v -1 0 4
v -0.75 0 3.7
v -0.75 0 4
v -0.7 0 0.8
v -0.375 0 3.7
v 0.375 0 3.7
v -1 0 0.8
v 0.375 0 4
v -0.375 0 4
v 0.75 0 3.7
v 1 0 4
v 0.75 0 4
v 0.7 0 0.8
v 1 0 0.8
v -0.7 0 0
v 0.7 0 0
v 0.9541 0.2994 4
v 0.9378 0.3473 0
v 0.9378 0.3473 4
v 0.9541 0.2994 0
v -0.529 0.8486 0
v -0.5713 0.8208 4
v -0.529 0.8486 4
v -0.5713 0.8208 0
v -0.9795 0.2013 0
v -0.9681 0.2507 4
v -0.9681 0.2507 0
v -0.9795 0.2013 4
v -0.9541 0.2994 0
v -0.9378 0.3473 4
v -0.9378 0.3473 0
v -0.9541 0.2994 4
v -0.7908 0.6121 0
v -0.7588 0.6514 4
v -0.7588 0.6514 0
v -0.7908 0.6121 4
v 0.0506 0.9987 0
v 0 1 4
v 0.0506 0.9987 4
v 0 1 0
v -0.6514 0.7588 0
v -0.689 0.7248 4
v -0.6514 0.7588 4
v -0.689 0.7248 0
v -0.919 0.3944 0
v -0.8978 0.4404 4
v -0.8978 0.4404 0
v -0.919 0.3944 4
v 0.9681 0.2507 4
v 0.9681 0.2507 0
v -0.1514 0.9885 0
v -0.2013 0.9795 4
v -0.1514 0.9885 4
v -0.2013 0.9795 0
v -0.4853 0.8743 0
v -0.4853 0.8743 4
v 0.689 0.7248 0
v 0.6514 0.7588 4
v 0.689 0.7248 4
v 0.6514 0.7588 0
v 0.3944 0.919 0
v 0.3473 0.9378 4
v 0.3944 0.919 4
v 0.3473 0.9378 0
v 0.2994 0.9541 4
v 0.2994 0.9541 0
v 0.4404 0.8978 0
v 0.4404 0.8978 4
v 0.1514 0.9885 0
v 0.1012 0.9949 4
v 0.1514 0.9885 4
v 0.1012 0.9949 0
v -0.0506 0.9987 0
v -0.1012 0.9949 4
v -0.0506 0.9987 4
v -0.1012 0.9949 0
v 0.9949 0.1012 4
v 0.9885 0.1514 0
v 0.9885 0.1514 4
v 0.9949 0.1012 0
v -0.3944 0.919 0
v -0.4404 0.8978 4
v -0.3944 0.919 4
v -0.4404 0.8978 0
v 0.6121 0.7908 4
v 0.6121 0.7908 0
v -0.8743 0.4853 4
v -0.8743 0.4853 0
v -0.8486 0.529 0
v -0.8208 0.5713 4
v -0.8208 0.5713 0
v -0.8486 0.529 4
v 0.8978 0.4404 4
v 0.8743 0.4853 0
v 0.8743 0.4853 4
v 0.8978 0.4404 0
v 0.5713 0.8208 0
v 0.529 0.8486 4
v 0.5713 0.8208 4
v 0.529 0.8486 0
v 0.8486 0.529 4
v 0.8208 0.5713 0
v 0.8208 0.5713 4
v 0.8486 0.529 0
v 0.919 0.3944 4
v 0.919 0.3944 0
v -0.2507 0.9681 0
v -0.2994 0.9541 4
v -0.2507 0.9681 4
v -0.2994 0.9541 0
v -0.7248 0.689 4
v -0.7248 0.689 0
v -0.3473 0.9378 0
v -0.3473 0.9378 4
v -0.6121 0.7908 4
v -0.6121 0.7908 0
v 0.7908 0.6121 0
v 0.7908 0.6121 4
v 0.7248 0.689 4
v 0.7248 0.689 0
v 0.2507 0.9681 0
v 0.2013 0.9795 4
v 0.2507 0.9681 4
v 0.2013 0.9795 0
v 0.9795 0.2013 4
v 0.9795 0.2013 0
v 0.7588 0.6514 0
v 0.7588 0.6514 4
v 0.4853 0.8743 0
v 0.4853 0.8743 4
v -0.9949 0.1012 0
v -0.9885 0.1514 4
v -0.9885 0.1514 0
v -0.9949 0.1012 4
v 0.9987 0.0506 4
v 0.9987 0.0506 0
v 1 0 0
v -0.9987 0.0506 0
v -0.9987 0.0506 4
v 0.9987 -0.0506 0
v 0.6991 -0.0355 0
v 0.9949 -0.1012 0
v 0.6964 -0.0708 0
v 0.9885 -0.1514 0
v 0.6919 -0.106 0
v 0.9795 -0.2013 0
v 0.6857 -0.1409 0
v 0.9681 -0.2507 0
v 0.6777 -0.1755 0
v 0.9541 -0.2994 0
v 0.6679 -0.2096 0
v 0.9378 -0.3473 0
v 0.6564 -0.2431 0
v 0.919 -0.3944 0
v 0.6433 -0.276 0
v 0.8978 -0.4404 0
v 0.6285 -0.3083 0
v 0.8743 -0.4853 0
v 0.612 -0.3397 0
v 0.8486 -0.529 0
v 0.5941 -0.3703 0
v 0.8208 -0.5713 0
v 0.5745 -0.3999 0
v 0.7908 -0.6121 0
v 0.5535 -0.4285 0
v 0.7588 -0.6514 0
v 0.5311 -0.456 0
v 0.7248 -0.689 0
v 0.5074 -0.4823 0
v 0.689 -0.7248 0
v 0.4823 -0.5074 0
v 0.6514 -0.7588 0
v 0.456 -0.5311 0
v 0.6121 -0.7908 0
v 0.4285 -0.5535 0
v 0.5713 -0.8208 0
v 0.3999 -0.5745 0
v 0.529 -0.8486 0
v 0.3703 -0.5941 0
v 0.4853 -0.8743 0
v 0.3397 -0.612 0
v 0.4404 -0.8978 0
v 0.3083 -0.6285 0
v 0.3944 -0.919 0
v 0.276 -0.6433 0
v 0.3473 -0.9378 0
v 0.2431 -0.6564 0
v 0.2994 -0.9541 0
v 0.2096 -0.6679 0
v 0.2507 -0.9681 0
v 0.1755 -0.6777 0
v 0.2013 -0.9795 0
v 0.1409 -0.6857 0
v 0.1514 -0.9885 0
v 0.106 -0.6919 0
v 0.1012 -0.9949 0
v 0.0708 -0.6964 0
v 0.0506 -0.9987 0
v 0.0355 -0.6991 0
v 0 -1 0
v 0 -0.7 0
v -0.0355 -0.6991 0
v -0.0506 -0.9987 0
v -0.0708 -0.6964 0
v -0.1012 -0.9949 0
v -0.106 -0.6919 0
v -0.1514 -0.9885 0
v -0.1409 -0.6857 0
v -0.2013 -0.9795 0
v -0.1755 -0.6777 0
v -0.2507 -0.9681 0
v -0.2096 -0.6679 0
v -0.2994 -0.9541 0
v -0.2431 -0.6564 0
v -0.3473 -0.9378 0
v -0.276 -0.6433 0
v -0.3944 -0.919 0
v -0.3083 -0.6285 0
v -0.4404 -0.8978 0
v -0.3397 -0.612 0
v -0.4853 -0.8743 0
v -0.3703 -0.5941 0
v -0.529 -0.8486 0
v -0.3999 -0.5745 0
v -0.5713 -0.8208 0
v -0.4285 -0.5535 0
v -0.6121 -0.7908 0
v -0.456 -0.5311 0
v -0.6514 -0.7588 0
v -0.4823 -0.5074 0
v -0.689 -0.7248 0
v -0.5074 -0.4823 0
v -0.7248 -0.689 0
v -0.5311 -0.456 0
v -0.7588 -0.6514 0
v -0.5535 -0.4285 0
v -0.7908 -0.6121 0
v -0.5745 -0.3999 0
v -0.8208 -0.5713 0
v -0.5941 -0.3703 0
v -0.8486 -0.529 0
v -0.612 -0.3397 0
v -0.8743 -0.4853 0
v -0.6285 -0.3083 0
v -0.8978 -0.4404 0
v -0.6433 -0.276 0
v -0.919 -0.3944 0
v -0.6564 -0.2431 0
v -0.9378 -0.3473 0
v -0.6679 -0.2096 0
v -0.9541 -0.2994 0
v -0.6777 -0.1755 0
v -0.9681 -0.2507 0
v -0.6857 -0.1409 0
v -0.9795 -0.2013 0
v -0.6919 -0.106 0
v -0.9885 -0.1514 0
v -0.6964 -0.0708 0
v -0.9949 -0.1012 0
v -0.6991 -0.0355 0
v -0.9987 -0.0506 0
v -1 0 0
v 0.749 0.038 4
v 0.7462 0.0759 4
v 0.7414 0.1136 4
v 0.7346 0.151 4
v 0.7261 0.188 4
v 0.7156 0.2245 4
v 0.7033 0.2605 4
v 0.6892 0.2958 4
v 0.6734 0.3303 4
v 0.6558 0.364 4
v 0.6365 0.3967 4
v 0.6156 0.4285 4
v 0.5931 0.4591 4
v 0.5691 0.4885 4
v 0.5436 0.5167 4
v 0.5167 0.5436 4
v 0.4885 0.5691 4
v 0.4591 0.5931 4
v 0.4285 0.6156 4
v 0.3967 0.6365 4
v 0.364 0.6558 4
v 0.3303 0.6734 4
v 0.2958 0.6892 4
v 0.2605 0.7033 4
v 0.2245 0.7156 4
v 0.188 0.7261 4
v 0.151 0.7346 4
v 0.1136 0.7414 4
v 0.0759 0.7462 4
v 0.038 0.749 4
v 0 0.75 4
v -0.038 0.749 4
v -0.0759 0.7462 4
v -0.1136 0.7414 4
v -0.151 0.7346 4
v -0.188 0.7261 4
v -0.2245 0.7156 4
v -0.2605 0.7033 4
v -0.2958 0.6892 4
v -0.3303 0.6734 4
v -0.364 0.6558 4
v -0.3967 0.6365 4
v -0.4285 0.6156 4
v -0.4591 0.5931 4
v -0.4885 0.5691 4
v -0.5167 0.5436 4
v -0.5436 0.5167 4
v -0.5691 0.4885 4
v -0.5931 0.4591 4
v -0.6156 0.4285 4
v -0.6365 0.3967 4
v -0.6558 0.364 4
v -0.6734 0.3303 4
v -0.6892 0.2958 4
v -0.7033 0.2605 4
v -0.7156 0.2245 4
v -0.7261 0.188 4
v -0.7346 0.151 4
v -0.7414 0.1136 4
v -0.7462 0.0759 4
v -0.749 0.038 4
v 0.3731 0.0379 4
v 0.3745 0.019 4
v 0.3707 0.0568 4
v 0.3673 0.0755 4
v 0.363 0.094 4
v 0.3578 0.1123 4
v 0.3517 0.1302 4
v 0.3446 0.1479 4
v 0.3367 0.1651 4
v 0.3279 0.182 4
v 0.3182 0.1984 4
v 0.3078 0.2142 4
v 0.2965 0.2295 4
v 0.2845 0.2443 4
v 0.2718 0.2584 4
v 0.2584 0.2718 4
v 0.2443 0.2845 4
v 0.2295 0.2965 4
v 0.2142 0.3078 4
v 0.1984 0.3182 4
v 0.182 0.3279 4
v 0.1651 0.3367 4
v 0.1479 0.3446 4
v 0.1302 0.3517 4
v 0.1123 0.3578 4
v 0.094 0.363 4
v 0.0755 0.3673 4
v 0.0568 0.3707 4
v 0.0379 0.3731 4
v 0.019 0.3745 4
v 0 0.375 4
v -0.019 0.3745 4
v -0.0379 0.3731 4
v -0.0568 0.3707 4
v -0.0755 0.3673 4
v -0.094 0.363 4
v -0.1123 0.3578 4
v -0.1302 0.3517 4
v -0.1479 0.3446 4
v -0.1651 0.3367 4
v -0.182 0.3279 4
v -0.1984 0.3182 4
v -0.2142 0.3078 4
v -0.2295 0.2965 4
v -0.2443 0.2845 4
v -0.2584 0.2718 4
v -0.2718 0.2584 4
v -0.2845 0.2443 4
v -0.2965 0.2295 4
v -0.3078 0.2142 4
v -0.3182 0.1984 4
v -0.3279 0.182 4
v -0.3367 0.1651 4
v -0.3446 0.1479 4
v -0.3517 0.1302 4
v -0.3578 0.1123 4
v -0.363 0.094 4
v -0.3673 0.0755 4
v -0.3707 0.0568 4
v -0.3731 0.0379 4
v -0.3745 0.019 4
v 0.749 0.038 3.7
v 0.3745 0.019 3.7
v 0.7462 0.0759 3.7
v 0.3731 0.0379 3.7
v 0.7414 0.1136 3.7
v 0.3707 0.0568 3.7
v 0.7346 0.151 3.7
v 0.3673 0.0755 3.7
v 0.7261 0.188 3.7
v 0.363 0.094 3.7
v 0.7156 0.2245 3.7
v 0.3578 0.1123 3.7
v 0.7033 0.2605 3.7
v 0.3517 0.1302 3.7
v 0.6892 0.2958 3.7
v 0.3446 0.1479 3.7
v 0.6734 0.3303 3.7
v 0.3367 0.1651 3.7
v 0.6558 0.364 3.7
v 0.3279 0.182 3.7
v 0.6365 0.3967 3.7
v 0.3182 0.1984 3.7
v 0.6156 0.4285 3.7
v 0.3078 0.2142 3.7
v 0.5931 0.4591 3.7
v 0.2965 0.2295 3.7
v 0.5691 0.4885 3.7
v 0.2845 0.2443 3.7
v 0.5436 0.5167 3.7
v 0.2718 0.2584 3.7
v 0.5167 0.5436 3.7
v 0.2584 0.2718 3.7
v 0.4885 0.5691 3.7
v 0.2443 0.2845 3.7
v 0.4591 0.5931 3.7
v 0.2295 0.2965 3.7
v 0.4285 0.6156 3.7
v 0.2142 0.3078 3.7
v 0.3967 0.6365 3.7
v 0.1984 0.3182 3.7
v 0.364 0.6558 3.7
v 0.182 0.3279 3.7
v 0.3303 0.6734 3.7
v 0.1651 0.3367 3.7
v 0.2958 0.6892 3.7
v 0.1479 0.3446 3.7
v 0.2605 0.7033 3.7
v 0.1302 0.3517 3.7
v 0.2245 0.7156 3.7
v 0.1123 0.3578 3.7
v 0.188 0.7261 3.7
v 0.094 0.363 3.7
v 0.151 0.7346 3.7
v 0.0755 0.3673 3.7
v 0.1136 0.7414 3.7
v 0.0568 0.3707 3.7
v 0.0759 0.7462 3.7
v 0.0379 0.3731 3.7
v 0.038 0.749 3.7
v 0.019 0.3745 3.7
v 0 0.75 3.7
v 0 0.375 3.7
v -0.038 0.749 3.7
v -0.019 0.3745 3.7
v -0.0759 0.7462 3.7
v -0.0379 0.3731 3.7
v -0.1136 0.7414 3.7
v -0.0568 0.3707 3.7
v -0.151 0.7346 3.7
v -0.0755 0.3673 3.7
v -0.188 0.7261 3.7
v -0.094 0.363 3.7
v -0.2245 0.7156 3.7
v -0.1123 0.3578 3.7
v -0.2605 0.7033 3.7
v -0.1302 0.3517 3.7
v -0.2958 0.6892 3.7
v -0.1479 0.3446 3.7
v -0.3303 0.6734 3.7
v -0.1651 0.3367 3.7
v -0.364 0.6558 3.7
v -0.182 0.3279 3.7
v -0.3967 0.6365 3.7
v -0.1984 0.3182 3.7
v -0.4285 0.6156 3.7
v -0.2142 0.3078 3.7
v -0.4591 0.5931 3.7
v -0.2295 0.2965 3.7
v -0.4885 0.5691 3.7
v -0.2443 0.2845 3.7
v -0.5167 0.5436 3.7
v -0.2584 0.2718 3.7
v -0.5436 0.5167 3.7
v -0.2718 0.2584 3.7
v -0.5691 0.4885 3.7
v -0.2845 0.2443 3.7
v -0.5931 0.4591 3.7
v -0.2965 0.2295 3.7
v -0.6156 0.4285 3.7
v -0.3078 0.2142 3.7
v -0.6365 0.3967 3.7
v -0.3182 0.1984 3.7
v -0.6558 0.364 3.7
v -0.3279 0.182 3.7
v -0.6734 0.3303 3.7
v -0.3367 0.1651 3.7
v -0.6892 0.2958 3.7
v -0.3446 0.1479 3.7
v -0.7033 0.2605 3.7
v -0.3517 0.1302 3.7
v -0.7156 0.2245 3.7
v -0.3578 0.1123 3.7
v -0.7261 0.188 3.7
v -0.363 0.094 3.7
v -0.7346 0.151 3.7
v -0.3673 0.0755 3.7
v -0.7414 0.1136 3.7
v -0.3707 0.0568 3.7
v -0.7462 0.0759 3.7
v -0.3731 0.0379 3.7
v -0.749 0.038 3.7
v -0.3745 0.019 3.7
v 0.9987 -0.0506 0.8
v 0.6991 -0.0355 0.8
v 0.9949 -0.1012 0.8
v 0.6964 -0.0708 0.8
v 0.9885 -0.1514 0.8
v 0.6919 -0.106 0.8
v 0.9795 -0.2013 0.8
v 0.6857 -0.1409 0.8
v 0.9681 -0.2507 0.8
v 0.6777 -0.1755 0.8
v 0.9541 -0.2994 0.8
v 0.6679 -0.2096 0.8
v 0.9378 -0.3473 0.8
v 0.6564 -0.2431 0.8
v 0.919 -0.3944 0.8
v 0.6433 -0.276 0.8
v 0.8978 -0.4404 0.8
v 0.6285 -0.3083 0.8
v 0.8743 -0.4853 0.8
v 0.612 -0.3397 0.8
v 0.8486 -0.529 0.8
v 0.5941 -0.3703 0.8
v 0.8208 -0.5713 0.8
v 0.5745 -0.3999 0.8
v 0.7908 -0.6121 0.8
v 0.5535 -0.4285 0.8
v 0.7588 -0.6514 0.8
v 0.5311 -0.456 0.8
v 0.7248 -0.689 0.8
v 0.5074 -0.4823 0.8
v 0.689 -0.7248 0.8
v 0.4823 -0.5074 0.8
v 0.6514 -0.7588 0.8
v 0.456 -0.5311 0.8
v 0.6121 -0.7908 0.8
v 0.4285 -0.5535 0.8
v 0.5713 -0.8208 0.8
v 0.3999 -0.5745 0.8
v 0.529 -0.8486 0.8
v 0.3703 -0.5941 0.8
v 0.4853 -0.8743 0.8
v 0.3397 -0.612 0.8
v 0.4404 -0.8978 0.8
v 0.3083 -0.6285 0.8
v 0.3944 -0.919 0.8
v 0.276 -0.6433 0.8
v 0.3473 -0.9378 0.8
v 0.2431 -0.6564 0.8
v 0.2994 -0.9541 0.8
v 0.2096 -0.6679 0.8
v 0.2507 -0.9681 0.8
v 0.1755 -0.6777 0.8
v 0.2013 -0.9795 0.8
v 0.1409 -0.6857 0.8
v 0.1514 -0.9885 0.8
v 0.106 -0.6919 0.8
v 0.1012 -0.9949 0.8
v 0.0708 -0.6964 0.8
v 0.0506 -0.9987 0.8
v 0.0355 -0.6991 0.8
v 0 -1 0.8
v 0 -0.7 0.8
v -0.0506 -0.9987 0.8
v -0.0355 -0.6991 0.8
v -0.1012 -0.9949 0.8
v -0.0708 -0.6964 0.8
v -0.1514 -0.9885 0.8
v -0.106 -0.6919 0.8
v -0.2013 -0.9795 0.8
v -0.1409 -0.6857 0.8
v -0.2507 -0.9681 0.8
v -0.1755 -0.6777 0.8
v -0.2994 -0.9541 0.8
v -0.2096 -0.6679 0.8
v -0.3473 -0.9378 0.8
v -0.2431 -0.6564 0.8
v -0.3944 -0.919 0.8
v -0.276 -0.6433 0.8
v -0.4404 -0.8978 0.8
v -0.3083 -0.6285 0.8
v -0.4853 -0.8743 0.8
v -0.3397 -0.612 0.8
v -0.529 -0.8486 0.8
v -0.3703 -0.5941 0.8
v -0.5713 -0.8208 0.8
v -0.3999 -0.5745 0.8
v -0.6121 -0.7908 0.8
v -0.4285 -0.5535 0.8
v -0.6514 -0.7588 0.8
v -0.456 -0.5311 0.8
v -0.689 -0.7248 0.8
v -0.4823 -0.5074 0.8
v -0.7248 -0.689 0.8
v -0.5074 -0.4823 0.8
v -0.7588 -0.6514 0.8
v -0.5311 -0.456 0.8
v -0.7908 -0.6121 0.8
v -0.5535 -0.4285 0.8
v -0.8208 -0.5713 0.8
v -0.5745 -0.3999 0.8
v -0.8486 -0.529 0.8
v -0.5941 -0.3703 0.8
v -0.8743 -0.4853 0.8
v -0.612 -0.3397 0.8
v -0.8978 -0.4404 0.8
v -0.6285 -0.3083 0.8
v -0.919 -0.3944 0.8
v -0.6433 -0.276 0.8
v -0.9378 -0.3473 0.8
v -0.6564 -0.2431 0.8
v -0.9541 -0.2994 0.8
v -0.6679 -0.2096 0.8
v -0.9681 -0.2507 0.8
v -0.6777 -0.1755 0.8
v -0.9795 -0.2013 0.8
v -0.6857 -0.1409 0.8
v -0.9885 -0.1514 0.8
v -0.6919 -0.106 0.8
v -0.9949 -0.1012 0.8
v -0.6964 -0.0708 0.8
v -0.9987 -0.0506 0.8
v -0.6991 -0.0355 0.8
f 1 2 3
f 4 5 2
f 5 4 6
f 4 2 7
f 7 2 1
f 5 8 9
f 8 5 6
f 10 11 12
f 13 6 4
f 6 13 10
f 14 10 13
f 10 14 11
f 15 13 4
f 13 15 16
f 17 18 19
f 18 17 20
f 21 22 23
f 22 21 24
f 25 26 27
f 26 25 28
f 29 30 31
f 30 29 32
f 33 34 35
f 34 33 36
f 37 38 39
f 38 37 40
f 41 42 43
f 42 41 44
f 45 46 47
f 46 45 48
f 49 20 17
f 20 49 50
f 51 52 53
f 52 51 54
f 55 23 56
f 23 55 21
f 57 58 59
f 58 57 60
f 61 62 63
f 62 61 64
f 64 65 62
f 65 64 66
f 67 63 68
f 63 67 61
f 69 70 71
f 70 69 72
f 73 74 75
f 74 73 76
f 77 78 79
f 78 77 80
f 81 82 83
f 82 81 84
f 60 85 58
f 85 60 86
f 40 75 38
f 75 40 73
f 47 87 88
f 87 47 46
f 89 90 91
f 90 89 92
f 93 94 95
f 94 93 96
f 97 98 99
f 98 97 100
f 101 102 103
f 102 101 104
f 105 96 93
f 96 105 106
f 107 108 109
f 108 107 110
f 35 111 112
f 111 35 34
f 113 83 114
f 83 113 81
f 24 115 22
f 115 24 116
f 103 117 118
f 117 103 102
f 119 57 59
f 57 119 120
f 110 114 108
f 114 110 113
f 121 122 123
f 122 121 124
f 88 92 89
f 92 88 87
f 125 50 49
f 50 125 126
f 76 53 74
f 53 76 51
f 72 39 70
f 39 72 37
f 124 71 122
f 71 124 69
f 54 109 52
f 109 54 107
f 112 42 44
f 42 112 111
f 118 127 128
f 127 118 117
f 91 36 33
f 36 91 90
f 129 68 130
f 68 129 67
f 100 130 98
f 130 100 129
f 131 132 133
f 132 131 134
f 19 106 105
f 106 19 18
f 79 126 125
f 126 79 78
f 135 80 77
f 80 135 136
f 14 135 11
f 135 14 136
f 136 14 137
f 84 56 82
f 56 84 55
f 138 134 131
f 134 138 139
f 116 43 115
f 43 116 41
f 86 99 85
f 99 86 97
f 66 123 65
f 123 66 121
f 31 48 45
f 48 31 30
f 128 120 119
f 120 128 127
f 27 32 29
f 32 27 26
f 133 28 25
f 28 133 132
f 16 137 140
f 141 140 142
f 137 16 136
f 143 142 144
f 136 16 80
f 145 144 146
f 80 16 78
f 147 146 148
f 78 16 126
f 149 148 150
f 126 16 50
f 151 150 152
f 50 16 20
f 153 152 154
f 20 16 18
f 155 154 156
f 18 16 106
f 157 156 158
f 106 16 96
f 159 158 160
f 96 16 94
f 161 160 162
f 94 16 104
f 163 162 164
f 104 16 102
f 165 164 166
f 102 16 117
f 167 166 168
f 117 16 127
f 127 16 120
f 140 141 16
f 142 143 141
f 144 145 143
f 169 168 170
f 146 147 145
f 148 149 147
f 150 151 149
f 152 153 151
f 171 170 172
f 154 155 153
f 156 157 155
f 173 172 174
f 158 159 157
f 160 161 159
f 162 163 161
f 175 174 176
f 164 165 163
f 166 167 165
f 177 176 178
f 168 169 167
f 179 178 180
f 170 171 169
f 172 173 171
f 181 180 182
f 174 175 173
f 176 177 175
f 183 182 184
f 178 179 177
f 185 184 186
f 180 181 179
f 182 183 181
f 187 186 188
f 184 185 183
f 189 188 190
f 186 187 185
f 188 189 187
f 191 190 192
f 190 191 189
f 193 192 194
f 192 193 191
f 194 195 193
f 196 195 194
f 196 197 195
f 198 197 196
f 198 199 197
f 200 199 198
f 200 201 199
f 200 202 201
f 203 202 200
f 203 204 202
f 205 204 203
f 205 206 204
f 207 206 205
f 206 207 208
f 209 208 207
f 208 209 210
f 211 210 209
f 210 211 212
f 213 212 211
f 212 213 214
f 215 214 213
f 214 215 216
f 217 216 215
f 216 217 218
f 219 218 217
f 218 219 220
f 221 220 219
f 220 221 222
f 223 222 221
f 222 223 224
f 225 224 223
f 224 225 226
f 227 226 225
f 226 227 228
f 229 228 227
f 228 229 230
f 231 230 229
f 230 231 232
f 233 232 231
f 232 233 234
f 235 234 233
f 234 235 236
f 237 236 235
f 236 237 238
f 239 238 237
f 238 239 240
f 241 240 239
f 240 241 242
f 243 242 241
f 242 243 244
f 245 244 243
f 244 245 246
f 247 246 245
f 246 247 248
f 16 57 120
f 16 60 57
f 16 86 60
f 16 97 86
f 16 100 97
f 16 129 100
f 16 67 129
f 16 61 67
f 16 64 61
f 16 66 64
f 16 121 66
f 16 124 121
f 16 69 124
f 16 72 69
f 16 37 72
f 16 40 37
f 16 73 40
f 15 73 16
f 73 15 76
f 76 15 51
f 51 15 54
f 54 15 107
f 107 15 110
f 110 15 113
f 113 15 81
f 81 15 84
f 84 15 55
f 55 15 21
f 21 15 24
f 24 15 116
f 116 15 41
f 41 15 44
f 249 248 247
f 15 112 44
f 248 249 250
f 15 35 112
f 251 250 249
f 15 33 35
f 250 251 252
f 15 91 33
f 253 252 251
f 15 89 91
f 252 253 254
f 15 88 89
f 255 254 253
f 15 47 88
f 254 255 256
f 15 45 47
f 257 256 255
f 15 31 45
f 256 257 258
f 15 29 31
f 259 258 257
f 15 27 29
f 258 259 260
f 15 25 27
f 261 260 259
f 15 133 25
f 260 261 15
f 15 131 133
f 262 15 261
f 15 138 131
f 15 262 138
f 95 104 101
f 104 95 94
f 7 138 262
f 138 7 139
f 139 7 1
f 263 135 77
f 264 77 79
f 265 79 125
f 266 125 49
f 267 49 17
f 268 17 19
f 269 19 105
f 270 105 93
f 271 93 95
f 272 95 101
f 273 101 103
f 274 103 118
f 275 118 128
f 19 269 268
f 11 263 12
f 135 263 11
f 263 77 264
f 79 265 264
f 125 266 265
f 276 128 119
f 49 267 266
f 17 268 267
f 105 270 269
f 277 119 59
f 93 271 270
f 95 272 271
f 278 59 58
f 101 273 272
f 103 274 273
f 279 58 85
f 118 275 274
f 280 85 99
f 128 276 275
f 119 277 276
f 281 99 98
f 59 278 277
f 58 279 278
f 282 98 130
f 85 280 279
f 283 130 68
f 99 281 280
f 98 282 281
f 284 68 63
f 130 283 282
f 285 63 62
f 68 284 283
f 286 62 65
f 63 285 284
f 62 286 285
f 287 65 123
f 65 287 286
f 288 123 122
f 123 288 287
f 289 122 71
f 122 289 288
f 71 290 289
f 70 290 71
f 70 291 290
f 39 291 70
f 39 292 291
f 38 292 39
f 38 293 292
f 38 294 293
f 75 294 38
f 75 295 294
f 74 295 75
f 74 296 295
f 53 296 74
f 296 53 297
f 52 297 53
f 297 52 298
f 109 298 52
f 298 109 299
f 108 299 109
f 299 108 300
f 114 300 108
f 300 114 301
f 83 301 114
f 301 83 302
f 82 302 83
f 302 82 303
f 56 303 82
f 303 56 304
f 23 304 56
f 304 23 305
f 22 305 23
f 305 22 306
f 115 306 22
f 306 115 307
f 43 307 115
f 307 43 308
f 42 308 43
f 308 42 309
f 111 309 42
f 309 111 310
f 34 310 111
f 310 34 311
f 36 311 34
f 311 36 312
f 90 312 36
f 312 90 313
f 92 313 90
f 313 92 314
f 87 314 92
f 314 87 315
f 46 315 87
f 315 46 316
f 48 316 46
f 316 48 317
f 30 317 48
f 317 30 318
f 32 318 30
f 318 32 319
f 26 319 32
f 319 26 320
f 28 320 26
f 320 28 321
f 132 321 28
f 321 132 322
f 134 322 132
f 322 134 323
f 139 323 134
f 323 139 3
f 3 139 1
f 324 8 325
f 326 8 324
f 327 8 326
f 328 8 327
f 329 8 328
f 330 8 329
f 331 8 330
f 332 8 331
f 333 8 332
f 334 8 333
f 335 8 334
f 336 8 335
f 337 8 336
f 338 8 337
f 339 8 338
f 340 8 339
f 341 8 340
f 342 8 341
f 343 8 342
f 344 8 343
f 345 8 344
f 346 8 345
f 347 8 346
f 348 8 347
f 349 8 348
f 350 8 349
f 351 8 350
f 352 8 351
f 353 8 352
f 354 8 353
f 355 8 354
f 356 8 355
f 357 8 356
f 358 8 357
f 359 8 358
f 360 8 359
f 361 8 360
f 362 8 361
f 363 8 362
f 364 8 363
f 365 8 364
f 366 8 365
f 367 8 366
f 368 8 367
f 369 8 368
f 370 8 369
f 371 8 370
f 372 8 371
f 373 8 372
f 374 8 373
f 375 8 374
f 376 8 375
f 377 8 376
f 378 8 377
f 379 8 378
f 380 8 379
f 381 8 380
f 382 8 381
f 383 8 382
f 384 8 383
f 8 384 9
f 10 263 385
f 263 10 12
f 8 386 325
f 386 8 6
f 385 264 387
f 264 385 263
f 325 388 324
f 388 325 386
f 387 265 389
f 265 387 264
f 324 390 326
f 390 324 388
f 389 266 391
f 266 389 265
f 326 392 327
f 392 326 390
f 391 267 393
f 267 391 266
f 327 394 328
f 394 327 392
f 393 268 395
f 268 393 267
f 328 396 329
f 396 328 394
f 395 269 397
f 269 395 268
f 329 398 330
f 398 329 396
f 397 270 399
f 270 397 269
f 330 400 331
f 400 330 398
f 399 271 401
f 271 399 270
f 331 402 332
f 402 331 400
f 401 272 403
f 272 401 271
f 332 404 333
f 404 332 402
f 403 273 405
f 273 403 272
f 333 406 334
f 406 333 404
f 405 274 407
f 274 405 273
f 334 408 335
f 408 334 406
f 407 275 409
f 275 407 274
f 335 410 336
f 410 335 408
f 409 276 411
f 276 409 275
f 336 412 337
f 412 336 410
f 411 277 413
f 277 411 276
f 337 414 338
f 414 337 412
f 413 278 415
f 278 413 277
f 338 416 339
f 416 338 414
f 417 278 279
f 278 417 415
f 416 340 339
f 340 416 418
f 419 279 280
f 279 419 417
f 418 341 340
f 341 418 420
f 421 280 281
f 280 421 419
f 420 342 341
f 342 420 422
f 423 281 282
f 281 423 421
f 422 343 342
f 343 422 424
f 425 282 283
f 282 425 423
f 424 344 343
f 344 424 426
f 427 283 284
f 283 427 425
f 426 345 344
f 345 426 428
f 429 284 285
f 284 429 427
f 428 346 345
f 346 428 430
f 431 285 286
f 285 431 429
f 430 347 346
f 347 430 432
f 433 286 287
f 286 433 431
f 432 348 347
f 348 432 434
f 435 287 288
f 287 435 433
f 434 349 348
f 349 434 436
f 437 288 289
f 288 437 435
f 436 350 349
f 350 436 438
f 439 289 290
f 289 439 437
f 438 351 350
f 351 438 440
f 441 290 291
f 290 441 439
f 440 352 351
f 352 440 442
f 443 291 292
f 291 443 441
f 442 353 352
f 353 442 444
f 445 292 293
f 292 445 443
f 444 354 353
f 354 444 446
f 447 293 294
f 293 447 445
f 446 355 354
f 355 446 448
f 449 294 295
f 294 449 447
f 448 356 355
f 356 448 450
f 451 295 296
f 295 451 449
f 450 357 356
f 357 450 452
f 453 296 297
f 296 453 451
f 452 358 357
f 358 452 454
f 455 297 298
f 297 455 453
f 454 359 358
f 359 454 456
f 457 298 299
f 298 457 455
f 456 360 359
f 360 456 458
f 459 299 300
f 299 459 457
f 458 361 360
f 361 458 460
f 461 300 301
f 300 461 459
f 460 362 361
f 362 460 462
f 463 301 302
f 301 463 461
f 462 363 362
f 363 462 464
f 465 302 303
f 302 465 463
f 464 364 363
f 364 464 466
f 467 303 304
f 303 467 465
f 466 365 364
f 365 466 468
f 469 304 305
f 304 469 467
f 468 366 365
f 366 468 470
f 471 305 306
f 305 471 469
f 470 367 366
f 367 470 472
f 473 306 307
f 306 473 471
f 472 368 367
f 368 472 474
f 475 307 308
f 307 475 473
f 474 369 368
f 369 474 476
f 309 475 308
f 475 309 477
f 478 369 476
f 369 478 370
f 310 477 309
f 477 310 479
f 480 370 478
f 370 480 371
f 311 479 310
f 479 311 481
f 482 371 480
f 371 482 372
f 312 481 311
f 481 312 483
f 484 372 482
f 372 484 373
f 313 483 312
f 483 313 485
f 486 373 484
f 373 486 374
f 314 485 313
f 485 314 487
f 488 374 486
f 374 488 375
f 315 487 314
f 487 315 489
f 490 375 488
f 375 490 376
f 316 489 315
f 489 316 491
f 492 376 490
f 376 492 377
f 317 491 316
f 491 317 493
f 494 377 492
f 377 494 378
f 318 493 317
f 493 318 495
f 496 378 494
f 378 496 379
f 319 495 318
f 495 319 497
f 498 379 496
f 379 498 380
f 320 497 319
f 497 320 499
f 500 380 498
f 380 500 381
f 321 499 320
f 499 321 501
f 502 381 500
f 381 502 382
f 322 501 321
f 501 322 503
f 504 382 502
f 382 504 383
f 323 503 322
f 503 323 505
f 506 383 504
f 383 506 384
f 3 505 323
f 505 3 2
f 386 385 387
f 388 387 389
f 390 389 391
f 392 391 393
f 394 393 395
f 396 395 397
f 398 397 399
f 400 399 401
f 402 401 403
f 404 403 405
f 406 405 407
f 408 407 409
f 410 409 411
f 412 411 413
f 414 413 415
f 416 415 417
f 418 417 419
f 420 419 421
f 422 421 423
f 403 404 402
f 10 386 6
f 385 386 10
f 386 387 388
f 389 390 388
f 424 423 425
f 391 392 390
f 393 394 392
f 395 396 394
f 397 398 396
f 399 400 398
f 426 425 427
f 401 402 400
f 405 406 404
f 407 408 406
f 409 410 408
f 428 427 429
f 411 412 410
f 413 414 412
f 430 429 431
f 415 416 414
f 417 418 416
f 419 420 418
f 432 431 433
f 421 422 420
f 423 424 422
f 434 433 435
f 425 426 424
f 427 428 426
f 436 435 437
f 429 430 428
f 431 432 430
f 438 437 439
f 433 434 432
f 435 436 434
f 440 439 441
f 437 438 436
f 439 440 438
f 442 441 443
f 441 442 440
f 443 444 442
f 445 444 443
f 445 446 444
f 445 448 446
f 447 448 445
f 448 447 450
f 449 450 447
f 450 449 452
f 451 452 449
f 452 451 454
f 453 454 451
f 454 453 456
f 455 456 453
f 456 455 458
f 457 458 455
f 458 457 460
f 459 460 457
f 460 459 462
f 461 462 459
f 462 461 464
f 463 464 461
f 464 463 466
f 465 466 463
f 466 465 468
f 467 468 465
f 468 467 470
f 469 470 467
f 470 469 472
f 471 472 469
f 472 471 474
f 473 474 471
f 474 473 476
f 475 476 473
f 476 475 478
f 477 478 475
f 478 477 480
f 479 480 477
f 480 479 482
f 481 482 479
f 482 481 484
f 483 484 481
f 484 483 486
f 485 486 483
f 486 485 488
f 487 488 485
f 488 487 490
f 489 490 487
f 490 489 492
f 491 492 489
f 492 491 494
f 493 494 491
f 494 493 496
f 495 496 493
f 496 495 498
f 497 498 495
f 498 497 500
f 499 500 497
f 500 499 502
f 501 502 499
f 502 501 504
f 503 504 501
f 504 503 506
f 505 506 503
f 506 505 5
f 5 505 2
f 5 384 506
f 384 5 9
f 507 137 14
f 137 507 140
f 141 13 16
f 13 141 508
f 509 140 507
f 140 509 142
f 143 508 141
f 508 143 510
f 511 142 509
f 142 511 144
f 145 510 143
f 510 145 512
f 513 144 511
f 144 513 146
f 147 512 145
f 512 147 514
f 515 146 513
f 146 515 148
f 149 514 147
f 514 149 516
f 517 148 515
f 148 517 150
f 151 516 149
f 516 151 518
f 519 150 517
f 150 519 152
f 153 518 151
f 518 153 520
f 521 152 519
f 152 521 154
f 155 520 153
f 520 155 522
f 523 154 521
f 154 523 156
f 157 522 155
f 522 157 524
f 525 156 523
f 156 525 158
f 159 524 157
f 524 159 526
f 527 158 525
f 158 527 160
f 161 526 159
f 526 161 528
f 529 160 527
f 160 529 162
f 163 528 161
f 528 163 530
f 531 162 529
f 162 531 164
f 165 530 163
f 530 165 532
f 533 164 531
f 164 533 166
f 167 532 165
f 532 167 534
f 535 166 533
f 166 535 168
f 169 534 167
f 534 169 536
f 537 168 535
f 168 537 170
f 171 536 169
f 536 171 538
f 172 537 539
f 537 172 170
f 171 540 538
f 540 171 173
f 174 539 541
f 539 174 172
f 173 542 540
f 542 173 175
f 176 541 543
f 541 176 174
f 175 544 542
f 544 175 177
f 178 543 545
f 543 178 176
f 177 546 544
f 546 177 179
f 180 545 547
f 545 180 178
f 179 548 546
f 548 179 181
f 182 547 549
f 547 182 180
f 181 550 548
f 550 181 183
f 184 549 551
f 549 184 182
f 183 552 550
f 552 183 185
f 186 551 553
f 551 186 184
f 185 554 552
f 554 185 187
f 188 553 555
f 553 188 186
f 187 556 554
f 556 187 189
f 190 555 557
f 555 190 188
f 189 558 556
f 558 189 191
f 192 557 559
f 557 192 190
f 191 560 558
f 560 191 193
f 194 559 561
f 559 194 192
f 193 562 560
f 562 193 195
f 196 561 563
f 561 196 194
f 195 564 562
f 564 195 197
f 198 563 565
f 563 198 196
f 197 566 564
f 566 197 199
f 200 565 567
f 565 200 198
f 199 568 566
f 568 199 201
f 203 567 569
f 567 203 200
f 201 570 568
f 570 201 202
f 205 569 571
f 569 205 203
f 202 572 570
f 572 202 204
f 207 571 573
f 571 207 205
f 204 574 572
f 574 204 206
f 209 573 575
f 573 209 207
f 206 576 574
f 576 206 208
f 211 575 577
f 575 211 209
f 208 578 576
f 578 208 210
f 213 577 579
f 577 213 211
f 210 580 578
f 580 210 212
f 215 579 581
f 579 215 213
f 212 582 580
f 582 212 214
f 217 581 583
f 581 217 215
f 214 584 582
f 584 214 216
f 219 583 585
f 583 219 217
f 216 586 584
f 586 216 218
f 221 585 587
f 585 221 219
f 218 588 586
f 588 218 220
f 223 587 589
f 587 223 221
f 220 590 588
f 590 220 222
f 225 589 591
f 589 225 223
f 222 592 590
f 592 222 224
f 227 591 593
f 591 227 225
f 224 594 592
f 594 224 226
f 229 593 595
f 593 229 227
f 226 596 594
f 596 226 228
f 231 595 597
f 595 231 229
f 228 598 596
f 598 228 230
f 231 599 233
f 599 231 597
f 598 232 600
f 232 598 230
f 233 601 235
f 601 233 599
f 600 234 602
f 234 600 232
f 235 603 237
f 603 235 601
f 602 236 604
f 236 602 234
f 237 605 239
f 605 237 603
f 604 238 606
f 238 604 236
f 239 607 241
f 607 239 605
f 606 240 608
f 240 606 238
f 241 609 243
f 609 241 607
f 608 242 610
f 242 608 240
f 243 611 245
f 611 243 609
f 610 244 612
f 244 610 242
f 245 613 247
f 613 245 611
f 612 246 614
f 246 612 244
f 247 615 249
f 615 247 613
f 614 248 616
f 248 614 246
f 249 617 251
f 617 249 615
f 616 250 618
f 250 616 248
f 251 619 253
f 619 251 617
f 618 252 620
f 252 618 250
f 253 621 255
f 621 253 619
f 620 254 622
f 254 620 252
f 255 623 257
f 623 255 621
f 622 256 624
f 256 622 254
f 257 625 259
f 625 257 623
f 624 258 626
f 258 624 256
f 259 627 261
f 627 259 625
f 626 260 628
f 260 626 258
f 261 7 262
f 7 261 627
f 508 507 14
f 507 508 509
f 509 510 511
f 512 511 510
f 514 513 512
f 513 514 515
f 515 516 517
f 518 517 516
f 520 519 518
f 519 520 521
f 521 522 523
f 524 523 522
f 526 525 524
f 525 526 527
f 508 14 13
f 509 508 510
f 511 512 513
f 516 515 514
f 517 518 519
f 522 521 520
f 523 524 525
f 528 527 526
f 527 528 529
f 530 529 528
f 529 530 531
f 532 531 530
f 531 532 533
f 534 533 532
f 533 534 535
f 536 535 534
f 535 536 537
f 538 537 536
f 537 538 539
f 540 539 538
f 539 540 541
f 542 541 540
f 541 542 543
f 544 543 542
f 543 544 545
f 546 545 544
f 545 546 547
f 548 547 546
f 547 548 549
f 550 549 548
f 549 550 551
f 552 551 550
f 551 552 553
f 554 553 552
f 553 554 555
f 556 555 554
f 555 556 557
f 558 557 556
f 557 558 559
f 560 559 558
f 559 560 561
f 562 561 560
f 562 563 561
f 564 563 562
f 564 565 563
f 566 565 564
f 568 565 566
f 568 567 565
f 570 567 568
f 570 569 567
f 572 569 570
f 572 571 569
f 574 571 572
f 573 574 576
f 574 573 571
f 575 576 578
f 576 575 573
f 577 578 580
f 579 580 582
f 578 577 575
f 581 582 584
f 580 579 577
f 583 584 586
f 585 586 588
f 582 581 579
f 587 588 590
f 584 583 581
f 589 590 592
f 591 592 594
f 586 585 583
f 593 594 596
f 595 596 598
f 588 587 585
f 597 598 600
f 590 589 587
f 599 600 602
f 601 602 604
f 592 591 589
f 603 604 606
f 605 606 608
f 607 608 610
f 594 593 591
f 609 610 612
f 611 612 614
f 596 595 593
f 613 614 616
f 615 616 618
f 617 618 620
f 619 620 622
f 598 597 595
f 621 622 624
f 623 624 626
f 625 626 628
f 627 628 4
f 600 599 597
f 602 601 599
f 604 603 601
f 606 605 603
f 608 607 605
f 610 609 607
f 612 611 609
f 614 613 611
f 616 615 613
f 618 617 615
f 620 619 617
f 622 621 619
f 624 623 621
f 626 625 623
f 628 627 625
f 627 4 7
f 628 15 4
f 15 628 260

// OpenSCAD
$fn = 125;

union() {
    difference() {
        rotate_extrude(angle=180)
        square([1, 4]);

        rotate_extrude(angle=180)
        translate([0.375, 3.7, 0])
        square([0.375, 0.3]);
    }

    rotate_extrude(angle=-180)
    translate([0.7, 0, 0])
    square([0.3, 0.8]);
}
